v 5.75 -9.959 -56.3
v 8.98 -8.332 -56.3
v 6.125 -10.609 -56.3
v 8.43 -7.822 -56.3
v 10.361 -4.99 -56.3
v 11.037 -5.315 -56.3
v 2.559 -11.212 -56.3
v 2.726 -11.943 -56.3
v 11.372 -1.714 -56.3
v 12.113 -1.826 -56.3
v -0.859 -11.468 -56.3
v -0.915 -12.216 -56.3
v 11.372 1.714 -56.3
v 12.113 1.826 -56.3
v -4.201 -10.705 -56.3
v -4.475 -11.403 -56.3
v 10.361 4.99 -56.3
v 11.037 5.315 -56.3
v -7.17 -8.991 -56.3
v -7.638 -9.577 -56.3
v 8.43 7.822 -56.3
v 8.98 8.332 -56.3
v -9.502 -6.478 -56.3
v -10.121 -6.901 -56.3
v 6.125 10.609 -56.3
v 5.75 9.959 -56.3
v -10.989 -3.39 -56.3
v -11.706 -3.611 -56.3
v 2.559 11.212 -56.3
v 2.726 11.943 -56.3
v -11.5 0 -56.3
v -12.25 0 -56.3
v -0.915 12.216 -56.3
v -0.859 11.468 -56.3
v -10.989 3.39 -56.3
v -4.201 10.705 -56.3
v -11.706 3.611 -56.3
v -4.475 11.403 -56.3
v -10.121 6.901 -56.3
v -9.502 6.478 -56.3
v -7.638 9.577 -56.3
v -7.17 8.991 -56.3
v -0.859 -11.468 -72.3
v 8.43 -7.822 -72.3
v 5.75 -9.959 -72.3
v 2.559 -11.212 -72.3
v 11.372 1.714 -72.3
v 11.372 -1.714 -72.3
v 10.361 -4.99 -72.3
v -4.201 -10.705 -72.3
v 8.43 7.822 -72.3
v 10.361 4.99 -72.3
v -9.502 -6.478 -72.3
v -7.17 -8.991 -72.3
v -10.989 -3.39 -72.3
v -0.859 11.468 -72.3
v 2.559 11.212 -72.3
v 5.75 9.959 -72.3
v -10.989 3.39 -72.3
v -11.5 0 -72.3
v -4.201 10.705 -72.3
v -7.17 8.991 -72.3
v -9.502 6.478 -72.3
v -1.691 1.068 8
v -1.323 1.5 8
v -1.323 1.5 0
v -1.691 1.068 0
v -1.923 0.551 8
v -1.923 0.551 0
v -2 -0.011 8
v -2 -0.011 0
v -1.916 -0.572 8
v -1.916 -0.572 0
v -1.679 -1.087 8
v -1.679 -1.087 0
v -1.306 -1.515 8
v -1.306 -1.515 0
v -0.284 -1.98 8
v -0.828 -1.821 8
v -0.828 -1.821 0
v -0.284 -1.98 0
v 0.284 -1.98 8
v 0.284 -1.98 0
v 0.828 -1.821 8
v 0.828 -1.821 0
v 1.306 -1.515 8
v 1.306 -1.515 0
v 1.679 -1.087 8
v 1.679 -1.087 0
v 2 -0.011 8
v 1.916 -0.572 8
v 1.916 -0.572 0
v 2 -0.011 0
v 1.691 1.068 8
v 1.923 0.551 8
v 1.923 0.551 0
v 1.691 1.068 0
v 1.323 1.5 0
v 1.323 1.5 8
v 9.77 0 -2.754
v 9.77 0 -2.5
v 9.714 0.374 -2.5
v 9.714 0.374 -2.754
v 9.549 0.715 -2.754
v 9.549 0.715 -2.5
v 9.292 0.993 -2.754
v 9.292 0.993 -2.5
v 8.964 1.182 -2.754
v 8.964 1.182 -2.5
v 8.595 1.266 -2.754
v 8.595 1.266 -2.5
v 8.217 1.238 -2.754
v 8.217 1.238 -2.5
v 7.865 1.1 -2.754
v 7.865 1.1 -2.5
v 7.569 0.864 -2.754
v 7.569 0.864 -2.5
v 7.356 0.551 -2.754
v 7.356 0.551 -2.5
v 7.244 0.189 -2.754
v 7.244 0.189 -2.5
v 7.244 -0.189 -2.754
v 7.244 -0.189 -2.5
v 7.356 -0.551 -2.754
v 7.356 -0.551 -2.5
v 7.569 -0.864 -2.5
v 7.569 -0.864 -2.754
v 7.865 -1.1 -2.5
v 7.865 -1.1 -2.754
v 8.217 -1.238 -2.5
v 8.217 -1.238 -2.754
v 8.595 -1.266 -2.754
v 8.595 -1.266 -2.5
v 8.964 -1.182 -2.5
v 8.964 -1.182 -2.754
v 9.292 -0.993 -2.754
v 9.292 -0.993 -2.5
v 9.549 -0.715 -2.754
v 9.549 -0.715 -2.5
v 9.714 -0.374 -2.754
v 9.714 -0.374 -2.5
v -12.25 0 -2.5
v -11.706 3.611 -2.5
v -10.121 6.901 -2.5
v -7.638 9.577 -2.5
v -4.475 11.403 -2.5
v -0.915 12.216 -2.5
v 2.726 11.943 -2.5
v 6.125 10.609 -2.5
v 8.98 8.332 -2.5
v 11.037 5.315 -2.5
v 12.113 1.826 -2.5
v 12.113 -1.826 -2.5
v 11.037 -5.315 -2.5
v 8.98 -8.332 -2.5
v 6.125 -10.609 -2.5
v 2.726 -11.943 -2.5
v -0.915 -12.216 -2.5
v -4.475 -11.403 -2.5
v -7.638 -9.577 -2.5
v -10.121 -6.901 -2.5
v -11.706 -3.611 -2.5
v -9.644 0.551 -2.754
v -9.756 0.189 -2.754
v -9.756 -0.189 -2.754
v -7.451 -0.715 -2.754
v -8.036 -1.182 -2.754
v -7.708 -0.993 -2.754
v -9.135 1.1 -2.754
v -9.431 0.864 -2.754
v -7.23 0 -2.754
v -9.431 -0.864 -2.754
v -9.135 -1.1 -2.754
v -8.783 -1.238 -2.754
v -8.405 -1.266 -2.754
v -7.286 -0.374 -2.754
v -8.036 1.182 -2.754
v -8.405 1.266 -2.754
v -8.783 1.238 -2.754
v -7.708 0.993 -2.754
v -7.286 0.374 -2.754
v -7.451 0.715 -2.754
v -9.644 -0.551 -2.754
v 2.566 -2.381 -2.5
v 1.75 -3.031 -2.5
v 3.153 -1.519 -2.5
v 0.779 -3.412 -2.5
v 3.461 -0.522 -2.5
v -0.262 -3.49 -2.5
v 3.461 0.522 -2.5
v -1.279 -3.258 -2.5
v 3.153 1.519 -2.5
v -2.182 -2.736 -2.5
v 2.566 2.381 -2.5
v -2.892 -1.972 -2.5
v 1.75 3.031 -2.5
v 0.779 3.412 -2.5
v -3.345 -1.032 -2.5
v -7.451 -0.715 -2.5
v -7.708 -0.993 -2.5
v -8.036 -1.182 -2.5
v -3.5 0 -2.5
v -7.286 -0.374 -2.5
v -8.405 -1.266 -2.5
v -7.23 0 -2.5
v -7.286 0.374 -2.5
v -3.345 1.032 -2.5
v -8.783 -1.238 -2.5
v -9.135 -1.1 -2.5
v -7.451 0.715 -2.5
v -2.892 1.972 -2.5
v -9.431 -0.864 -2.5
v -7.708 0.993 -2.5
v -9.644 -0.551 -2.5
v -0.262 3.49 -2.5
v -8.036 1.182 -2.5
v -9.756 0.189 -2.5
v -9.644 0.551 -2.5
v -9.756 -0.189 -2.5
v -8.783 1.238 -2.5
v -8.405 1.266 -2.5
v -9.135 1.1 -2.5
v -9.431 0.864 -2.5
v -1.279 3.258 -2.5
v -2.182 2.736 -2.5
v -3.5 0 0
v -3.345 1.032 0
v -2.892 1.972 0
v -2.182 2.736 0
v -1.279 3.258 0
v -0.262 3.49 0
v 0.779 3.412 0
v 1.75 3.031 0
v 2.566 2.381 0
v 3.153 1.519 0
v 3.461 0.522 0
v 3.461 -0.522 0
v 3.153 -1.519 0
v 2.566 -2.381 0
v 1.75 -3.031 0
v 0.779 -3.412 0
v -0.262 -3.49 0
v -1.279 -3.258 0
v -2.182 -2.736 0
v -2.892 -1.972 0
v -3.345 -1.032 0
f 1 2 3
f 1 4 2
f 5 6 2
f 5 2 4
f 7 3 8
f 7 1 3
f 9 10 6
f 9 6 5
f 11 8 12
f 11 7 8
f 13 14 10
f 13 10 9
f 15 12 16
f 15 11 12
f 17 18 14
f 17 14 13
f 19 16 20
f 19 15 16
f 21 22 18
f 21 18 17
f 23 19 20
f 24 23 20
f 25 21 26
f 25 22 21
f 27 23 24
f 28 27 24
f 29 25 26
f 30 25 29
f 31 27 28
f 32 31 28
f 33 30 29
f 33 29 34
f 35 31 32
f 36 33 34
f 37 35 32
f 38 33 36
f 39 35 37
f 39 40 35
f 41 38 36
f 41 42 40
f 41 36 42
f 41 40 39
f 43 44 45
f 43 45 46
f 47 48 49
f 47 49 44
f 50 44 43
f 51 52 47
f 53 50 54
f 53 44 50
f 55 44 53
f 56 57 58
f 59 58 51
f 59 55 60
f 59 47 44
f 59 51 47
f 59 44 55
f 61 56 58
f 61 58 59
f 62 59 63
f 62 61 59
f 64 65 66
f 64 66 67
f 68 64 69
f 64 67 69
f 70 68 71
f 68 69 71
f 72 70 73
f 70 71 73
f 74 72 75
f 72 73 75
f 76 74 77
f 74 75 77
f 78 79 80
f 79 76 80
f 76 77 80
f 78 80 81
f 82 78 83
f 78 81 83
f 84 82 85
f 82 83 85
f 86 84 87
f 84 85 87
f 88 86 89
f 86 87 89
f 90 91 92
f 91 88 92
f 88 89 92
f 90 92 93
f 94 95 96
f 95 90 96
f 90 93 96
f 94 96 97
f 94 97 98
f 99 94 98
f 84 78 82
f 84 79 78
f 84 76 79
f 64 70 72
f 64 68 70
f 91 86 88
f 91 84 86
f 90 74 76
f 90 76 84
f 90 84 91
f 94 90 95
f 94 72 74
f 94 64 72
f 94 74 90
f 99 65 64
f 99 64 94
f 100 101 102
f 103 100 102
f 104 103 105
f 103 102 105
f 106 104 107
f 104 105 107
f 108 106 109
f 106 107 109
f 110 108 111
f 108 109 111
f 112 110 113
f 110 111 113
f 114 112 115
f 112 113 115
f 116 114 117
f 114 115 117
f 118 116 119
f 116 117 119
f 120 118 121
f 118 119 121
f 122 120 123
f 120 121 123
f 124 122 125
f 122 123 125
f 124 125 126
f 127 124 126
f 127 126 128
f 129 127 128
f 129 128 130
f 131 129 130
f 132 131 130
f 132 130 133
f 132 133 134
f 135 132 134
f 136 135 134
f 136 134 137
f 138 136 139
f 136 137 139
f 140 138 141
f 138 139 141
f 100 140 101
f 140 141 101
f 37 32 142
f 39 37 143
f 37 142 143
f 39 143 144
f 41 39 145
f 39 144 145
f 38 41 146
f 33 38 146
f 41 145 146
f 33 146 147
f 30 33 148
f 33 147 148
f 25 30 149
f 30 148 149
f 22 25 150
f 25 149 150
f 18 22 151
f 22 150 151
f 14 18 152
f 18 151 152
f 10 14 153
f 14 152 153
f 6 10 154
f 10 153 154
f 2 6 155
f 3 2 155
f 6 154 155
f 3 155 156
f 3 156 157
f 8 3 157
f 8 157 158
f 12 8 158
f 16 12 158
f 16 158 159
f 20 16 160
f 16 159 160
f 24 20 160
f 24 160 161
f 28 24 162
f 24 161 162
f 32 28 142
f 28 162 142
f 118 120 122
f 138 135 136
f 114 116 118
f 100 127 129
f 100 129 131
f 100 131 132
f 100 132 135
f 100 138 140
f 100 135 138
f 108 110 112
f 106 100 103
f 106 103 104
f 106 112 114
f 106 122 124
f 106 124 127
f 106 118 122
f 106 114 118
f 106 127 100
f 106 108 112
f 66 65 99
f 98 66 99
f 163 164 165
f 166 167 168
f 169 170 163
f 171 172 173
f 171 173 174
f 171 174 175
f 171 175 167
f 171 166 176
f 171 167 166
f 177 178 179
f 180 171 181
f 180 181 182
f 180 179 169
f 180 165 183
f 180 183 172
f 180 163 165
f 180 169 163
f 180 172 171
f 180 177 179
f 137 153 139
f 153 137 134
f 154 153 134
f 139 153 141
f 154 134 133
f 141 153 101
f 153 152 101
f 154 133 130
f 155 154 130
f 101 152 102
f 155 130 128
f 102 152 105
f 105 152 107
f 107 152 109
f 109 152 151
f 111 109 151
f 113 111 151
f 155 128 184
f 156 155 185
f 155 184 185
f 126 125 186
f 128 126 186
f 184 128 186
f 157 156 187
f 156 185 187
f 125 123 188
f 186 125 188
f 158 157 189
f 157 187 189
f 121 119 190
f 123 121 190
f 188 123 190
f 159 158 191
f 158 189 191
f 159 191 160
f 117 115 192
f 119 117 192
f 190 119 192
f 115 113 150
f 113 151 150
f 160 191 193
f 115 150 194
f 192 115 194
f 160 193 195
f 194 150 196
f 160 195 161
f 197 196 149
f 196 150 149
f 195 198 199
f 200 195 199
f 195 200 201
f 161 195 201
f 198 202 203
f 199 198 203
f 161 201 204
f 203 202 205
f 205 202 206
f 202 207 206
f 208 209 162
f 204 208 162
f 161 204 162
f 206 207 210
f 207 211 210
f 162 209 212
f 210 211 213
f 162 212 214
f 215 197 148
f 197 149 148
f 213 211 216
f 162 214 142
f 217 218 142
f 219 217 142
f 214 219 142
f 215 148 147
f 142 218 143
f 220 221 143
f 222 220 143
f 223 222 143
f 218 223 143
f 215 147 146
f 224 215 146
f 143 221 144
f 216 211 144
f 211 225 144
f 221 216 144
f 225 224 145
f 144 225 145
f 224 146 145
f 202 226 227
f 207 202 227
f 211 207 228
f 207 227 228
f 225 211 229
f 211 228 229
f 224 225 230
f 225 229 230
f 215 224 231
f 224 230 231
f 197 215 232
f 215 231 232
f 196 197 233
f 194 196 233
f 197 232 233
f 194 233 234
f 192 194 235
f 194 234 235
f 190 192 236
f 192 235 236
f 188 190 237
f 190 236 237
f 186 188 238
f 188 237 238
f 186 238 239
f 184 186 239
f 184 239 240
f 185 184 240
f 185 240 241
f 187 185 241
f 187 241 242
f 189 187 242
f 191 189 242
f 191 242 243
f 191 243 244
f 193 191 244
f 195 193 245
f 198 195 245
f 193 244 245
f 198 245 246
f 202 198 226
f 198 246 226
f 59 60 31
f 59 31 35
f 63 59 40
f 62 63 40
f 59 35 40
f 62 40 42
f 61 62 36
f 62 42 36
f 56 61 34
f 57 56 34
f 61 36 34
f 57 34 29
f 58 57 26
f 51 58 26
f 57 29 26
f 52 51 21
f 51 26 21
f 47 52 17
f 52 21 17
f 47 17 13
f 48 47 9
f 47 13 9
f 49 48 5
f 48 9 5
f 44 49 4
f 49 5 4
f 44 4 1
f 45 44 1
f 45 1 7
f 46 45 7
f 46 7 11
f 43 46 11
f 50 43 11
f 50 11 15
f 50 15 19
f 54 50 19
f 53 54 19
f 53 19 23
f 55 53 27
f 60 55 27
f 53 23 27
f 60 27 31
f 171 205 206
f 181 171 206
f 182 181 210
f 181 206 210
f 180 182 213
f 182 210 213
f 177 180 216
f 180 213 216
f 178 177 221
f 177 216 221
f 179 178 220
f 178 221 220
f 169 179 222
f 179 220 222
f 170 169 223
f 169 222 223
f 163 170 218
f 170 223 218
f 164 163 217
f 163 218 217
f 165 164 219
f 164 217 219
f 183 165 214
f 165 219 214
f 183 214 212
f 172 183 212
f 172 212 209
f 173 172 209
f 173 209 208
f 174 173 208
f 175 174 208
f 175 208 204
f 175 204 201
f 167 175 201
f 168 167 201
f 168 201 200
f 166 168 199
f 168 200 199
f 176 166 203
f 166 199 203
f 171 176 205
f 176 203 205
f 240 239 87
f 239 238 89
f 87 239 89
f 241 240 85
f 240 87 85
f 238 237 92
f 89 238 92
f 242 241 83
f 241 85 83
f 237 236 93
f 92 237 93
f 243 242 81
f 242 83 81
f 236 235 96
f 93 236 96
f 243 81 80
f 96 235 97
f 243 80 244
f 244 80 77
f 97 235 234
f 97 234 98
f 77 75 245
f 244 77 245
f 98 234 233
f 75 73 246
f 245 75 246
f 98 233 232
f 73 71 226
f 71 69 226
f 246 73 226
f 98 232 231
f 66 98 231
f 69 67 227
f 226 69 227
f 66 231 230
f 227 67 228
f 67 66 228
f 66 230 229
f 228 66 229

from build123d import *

# Parameters (mm, degrees)
SKETCH1_R           = 2
BOSS_EXTRUDE1_DEPTH = 8
SKETCH2_R           = 3.5
BOSS_EXTRUDE2_DEPTH = 2.5
SKETCH3_R           = 12.25
BOSS_EXTRUDE3_DEPTH = 53.8
SKETCH4_R           = 1.27
CUT_EXTRUDE1_DEPTH  = 0.254
SKETCH5_R           = 11.5
BOSS_EXTRUDE4_DEPTH = 16
CUT_EXTRUDE2_DEPTH  = 8


with BuildPart() as part:
    # Sketch1 → Boss-Extrude1 (new body)
    with BuildSketch(Plane.XY):
        Circle(SKETCH1_R)
    extrude(amount=BOSS_EXTRUDE1_DEPTH)

    # Sketch2 → Boss-Extrude2 (add)
    with BuildSketch(Plane(origin=(0, 0, 0), x_dir=(-1, 0, 0), z_dir=(0, 0, -1))):
        Circle(SKETCH2_R)
    extrude(amount=BOSS_EXTRUDE2_DEPTH)

    # Sketch3 → Boss-Extrude3 (add)
    with BuildSketch(Plane(origin=(0, 0, -2.5), x_dir=(-1, 0, 0), z_dir=(0, 0, -1))):
        Circle(SKETCH3_R)
    extrude(amount=BOSS_EXTRUDE3_DEPTH)

    # Sketch4 → Cut-Extrude1 (cut)
    with BuildSketch(Plane.XY.offset(-2.5)):
        with Locations((8.5, 0)):
            Circle(SKETCH4_R)
        with Locations((-8.5, 0)):
            Circle(SKETCH4_R)
    extrude(amount=-CUT_EXTRUDE1_DEPTH, mode=Mode.SUBTRACT)

    # Sketch5 → Boss-Extrude4 (add)
    with BuildSketch(Plane(origin=(0, 0, -56.3), x_dir=(-1, 0, 0), z_dir=(0, 0, -1))):
        Circle(SKETCH5_R)
    extrude(amount=BOSS_EXTRUDE4_DEPTH)

    # Sketch6 → Cut-Extrude2 (cut)
    with BuildSketch(Plane.XY.offset(8)):
        with BuildLine():
            Line((-1.322875656, 1.5), (1.322875656, 1.5))
            ThreePointArc((1.322875656, 1.5), (0, 2), (-1.322875656, 1.5))
        make_face()
    extrude(amount=-CUT_EXTRUDE2_DEPTH, mode=Mode.SUBTRACT)


solid = part.part
